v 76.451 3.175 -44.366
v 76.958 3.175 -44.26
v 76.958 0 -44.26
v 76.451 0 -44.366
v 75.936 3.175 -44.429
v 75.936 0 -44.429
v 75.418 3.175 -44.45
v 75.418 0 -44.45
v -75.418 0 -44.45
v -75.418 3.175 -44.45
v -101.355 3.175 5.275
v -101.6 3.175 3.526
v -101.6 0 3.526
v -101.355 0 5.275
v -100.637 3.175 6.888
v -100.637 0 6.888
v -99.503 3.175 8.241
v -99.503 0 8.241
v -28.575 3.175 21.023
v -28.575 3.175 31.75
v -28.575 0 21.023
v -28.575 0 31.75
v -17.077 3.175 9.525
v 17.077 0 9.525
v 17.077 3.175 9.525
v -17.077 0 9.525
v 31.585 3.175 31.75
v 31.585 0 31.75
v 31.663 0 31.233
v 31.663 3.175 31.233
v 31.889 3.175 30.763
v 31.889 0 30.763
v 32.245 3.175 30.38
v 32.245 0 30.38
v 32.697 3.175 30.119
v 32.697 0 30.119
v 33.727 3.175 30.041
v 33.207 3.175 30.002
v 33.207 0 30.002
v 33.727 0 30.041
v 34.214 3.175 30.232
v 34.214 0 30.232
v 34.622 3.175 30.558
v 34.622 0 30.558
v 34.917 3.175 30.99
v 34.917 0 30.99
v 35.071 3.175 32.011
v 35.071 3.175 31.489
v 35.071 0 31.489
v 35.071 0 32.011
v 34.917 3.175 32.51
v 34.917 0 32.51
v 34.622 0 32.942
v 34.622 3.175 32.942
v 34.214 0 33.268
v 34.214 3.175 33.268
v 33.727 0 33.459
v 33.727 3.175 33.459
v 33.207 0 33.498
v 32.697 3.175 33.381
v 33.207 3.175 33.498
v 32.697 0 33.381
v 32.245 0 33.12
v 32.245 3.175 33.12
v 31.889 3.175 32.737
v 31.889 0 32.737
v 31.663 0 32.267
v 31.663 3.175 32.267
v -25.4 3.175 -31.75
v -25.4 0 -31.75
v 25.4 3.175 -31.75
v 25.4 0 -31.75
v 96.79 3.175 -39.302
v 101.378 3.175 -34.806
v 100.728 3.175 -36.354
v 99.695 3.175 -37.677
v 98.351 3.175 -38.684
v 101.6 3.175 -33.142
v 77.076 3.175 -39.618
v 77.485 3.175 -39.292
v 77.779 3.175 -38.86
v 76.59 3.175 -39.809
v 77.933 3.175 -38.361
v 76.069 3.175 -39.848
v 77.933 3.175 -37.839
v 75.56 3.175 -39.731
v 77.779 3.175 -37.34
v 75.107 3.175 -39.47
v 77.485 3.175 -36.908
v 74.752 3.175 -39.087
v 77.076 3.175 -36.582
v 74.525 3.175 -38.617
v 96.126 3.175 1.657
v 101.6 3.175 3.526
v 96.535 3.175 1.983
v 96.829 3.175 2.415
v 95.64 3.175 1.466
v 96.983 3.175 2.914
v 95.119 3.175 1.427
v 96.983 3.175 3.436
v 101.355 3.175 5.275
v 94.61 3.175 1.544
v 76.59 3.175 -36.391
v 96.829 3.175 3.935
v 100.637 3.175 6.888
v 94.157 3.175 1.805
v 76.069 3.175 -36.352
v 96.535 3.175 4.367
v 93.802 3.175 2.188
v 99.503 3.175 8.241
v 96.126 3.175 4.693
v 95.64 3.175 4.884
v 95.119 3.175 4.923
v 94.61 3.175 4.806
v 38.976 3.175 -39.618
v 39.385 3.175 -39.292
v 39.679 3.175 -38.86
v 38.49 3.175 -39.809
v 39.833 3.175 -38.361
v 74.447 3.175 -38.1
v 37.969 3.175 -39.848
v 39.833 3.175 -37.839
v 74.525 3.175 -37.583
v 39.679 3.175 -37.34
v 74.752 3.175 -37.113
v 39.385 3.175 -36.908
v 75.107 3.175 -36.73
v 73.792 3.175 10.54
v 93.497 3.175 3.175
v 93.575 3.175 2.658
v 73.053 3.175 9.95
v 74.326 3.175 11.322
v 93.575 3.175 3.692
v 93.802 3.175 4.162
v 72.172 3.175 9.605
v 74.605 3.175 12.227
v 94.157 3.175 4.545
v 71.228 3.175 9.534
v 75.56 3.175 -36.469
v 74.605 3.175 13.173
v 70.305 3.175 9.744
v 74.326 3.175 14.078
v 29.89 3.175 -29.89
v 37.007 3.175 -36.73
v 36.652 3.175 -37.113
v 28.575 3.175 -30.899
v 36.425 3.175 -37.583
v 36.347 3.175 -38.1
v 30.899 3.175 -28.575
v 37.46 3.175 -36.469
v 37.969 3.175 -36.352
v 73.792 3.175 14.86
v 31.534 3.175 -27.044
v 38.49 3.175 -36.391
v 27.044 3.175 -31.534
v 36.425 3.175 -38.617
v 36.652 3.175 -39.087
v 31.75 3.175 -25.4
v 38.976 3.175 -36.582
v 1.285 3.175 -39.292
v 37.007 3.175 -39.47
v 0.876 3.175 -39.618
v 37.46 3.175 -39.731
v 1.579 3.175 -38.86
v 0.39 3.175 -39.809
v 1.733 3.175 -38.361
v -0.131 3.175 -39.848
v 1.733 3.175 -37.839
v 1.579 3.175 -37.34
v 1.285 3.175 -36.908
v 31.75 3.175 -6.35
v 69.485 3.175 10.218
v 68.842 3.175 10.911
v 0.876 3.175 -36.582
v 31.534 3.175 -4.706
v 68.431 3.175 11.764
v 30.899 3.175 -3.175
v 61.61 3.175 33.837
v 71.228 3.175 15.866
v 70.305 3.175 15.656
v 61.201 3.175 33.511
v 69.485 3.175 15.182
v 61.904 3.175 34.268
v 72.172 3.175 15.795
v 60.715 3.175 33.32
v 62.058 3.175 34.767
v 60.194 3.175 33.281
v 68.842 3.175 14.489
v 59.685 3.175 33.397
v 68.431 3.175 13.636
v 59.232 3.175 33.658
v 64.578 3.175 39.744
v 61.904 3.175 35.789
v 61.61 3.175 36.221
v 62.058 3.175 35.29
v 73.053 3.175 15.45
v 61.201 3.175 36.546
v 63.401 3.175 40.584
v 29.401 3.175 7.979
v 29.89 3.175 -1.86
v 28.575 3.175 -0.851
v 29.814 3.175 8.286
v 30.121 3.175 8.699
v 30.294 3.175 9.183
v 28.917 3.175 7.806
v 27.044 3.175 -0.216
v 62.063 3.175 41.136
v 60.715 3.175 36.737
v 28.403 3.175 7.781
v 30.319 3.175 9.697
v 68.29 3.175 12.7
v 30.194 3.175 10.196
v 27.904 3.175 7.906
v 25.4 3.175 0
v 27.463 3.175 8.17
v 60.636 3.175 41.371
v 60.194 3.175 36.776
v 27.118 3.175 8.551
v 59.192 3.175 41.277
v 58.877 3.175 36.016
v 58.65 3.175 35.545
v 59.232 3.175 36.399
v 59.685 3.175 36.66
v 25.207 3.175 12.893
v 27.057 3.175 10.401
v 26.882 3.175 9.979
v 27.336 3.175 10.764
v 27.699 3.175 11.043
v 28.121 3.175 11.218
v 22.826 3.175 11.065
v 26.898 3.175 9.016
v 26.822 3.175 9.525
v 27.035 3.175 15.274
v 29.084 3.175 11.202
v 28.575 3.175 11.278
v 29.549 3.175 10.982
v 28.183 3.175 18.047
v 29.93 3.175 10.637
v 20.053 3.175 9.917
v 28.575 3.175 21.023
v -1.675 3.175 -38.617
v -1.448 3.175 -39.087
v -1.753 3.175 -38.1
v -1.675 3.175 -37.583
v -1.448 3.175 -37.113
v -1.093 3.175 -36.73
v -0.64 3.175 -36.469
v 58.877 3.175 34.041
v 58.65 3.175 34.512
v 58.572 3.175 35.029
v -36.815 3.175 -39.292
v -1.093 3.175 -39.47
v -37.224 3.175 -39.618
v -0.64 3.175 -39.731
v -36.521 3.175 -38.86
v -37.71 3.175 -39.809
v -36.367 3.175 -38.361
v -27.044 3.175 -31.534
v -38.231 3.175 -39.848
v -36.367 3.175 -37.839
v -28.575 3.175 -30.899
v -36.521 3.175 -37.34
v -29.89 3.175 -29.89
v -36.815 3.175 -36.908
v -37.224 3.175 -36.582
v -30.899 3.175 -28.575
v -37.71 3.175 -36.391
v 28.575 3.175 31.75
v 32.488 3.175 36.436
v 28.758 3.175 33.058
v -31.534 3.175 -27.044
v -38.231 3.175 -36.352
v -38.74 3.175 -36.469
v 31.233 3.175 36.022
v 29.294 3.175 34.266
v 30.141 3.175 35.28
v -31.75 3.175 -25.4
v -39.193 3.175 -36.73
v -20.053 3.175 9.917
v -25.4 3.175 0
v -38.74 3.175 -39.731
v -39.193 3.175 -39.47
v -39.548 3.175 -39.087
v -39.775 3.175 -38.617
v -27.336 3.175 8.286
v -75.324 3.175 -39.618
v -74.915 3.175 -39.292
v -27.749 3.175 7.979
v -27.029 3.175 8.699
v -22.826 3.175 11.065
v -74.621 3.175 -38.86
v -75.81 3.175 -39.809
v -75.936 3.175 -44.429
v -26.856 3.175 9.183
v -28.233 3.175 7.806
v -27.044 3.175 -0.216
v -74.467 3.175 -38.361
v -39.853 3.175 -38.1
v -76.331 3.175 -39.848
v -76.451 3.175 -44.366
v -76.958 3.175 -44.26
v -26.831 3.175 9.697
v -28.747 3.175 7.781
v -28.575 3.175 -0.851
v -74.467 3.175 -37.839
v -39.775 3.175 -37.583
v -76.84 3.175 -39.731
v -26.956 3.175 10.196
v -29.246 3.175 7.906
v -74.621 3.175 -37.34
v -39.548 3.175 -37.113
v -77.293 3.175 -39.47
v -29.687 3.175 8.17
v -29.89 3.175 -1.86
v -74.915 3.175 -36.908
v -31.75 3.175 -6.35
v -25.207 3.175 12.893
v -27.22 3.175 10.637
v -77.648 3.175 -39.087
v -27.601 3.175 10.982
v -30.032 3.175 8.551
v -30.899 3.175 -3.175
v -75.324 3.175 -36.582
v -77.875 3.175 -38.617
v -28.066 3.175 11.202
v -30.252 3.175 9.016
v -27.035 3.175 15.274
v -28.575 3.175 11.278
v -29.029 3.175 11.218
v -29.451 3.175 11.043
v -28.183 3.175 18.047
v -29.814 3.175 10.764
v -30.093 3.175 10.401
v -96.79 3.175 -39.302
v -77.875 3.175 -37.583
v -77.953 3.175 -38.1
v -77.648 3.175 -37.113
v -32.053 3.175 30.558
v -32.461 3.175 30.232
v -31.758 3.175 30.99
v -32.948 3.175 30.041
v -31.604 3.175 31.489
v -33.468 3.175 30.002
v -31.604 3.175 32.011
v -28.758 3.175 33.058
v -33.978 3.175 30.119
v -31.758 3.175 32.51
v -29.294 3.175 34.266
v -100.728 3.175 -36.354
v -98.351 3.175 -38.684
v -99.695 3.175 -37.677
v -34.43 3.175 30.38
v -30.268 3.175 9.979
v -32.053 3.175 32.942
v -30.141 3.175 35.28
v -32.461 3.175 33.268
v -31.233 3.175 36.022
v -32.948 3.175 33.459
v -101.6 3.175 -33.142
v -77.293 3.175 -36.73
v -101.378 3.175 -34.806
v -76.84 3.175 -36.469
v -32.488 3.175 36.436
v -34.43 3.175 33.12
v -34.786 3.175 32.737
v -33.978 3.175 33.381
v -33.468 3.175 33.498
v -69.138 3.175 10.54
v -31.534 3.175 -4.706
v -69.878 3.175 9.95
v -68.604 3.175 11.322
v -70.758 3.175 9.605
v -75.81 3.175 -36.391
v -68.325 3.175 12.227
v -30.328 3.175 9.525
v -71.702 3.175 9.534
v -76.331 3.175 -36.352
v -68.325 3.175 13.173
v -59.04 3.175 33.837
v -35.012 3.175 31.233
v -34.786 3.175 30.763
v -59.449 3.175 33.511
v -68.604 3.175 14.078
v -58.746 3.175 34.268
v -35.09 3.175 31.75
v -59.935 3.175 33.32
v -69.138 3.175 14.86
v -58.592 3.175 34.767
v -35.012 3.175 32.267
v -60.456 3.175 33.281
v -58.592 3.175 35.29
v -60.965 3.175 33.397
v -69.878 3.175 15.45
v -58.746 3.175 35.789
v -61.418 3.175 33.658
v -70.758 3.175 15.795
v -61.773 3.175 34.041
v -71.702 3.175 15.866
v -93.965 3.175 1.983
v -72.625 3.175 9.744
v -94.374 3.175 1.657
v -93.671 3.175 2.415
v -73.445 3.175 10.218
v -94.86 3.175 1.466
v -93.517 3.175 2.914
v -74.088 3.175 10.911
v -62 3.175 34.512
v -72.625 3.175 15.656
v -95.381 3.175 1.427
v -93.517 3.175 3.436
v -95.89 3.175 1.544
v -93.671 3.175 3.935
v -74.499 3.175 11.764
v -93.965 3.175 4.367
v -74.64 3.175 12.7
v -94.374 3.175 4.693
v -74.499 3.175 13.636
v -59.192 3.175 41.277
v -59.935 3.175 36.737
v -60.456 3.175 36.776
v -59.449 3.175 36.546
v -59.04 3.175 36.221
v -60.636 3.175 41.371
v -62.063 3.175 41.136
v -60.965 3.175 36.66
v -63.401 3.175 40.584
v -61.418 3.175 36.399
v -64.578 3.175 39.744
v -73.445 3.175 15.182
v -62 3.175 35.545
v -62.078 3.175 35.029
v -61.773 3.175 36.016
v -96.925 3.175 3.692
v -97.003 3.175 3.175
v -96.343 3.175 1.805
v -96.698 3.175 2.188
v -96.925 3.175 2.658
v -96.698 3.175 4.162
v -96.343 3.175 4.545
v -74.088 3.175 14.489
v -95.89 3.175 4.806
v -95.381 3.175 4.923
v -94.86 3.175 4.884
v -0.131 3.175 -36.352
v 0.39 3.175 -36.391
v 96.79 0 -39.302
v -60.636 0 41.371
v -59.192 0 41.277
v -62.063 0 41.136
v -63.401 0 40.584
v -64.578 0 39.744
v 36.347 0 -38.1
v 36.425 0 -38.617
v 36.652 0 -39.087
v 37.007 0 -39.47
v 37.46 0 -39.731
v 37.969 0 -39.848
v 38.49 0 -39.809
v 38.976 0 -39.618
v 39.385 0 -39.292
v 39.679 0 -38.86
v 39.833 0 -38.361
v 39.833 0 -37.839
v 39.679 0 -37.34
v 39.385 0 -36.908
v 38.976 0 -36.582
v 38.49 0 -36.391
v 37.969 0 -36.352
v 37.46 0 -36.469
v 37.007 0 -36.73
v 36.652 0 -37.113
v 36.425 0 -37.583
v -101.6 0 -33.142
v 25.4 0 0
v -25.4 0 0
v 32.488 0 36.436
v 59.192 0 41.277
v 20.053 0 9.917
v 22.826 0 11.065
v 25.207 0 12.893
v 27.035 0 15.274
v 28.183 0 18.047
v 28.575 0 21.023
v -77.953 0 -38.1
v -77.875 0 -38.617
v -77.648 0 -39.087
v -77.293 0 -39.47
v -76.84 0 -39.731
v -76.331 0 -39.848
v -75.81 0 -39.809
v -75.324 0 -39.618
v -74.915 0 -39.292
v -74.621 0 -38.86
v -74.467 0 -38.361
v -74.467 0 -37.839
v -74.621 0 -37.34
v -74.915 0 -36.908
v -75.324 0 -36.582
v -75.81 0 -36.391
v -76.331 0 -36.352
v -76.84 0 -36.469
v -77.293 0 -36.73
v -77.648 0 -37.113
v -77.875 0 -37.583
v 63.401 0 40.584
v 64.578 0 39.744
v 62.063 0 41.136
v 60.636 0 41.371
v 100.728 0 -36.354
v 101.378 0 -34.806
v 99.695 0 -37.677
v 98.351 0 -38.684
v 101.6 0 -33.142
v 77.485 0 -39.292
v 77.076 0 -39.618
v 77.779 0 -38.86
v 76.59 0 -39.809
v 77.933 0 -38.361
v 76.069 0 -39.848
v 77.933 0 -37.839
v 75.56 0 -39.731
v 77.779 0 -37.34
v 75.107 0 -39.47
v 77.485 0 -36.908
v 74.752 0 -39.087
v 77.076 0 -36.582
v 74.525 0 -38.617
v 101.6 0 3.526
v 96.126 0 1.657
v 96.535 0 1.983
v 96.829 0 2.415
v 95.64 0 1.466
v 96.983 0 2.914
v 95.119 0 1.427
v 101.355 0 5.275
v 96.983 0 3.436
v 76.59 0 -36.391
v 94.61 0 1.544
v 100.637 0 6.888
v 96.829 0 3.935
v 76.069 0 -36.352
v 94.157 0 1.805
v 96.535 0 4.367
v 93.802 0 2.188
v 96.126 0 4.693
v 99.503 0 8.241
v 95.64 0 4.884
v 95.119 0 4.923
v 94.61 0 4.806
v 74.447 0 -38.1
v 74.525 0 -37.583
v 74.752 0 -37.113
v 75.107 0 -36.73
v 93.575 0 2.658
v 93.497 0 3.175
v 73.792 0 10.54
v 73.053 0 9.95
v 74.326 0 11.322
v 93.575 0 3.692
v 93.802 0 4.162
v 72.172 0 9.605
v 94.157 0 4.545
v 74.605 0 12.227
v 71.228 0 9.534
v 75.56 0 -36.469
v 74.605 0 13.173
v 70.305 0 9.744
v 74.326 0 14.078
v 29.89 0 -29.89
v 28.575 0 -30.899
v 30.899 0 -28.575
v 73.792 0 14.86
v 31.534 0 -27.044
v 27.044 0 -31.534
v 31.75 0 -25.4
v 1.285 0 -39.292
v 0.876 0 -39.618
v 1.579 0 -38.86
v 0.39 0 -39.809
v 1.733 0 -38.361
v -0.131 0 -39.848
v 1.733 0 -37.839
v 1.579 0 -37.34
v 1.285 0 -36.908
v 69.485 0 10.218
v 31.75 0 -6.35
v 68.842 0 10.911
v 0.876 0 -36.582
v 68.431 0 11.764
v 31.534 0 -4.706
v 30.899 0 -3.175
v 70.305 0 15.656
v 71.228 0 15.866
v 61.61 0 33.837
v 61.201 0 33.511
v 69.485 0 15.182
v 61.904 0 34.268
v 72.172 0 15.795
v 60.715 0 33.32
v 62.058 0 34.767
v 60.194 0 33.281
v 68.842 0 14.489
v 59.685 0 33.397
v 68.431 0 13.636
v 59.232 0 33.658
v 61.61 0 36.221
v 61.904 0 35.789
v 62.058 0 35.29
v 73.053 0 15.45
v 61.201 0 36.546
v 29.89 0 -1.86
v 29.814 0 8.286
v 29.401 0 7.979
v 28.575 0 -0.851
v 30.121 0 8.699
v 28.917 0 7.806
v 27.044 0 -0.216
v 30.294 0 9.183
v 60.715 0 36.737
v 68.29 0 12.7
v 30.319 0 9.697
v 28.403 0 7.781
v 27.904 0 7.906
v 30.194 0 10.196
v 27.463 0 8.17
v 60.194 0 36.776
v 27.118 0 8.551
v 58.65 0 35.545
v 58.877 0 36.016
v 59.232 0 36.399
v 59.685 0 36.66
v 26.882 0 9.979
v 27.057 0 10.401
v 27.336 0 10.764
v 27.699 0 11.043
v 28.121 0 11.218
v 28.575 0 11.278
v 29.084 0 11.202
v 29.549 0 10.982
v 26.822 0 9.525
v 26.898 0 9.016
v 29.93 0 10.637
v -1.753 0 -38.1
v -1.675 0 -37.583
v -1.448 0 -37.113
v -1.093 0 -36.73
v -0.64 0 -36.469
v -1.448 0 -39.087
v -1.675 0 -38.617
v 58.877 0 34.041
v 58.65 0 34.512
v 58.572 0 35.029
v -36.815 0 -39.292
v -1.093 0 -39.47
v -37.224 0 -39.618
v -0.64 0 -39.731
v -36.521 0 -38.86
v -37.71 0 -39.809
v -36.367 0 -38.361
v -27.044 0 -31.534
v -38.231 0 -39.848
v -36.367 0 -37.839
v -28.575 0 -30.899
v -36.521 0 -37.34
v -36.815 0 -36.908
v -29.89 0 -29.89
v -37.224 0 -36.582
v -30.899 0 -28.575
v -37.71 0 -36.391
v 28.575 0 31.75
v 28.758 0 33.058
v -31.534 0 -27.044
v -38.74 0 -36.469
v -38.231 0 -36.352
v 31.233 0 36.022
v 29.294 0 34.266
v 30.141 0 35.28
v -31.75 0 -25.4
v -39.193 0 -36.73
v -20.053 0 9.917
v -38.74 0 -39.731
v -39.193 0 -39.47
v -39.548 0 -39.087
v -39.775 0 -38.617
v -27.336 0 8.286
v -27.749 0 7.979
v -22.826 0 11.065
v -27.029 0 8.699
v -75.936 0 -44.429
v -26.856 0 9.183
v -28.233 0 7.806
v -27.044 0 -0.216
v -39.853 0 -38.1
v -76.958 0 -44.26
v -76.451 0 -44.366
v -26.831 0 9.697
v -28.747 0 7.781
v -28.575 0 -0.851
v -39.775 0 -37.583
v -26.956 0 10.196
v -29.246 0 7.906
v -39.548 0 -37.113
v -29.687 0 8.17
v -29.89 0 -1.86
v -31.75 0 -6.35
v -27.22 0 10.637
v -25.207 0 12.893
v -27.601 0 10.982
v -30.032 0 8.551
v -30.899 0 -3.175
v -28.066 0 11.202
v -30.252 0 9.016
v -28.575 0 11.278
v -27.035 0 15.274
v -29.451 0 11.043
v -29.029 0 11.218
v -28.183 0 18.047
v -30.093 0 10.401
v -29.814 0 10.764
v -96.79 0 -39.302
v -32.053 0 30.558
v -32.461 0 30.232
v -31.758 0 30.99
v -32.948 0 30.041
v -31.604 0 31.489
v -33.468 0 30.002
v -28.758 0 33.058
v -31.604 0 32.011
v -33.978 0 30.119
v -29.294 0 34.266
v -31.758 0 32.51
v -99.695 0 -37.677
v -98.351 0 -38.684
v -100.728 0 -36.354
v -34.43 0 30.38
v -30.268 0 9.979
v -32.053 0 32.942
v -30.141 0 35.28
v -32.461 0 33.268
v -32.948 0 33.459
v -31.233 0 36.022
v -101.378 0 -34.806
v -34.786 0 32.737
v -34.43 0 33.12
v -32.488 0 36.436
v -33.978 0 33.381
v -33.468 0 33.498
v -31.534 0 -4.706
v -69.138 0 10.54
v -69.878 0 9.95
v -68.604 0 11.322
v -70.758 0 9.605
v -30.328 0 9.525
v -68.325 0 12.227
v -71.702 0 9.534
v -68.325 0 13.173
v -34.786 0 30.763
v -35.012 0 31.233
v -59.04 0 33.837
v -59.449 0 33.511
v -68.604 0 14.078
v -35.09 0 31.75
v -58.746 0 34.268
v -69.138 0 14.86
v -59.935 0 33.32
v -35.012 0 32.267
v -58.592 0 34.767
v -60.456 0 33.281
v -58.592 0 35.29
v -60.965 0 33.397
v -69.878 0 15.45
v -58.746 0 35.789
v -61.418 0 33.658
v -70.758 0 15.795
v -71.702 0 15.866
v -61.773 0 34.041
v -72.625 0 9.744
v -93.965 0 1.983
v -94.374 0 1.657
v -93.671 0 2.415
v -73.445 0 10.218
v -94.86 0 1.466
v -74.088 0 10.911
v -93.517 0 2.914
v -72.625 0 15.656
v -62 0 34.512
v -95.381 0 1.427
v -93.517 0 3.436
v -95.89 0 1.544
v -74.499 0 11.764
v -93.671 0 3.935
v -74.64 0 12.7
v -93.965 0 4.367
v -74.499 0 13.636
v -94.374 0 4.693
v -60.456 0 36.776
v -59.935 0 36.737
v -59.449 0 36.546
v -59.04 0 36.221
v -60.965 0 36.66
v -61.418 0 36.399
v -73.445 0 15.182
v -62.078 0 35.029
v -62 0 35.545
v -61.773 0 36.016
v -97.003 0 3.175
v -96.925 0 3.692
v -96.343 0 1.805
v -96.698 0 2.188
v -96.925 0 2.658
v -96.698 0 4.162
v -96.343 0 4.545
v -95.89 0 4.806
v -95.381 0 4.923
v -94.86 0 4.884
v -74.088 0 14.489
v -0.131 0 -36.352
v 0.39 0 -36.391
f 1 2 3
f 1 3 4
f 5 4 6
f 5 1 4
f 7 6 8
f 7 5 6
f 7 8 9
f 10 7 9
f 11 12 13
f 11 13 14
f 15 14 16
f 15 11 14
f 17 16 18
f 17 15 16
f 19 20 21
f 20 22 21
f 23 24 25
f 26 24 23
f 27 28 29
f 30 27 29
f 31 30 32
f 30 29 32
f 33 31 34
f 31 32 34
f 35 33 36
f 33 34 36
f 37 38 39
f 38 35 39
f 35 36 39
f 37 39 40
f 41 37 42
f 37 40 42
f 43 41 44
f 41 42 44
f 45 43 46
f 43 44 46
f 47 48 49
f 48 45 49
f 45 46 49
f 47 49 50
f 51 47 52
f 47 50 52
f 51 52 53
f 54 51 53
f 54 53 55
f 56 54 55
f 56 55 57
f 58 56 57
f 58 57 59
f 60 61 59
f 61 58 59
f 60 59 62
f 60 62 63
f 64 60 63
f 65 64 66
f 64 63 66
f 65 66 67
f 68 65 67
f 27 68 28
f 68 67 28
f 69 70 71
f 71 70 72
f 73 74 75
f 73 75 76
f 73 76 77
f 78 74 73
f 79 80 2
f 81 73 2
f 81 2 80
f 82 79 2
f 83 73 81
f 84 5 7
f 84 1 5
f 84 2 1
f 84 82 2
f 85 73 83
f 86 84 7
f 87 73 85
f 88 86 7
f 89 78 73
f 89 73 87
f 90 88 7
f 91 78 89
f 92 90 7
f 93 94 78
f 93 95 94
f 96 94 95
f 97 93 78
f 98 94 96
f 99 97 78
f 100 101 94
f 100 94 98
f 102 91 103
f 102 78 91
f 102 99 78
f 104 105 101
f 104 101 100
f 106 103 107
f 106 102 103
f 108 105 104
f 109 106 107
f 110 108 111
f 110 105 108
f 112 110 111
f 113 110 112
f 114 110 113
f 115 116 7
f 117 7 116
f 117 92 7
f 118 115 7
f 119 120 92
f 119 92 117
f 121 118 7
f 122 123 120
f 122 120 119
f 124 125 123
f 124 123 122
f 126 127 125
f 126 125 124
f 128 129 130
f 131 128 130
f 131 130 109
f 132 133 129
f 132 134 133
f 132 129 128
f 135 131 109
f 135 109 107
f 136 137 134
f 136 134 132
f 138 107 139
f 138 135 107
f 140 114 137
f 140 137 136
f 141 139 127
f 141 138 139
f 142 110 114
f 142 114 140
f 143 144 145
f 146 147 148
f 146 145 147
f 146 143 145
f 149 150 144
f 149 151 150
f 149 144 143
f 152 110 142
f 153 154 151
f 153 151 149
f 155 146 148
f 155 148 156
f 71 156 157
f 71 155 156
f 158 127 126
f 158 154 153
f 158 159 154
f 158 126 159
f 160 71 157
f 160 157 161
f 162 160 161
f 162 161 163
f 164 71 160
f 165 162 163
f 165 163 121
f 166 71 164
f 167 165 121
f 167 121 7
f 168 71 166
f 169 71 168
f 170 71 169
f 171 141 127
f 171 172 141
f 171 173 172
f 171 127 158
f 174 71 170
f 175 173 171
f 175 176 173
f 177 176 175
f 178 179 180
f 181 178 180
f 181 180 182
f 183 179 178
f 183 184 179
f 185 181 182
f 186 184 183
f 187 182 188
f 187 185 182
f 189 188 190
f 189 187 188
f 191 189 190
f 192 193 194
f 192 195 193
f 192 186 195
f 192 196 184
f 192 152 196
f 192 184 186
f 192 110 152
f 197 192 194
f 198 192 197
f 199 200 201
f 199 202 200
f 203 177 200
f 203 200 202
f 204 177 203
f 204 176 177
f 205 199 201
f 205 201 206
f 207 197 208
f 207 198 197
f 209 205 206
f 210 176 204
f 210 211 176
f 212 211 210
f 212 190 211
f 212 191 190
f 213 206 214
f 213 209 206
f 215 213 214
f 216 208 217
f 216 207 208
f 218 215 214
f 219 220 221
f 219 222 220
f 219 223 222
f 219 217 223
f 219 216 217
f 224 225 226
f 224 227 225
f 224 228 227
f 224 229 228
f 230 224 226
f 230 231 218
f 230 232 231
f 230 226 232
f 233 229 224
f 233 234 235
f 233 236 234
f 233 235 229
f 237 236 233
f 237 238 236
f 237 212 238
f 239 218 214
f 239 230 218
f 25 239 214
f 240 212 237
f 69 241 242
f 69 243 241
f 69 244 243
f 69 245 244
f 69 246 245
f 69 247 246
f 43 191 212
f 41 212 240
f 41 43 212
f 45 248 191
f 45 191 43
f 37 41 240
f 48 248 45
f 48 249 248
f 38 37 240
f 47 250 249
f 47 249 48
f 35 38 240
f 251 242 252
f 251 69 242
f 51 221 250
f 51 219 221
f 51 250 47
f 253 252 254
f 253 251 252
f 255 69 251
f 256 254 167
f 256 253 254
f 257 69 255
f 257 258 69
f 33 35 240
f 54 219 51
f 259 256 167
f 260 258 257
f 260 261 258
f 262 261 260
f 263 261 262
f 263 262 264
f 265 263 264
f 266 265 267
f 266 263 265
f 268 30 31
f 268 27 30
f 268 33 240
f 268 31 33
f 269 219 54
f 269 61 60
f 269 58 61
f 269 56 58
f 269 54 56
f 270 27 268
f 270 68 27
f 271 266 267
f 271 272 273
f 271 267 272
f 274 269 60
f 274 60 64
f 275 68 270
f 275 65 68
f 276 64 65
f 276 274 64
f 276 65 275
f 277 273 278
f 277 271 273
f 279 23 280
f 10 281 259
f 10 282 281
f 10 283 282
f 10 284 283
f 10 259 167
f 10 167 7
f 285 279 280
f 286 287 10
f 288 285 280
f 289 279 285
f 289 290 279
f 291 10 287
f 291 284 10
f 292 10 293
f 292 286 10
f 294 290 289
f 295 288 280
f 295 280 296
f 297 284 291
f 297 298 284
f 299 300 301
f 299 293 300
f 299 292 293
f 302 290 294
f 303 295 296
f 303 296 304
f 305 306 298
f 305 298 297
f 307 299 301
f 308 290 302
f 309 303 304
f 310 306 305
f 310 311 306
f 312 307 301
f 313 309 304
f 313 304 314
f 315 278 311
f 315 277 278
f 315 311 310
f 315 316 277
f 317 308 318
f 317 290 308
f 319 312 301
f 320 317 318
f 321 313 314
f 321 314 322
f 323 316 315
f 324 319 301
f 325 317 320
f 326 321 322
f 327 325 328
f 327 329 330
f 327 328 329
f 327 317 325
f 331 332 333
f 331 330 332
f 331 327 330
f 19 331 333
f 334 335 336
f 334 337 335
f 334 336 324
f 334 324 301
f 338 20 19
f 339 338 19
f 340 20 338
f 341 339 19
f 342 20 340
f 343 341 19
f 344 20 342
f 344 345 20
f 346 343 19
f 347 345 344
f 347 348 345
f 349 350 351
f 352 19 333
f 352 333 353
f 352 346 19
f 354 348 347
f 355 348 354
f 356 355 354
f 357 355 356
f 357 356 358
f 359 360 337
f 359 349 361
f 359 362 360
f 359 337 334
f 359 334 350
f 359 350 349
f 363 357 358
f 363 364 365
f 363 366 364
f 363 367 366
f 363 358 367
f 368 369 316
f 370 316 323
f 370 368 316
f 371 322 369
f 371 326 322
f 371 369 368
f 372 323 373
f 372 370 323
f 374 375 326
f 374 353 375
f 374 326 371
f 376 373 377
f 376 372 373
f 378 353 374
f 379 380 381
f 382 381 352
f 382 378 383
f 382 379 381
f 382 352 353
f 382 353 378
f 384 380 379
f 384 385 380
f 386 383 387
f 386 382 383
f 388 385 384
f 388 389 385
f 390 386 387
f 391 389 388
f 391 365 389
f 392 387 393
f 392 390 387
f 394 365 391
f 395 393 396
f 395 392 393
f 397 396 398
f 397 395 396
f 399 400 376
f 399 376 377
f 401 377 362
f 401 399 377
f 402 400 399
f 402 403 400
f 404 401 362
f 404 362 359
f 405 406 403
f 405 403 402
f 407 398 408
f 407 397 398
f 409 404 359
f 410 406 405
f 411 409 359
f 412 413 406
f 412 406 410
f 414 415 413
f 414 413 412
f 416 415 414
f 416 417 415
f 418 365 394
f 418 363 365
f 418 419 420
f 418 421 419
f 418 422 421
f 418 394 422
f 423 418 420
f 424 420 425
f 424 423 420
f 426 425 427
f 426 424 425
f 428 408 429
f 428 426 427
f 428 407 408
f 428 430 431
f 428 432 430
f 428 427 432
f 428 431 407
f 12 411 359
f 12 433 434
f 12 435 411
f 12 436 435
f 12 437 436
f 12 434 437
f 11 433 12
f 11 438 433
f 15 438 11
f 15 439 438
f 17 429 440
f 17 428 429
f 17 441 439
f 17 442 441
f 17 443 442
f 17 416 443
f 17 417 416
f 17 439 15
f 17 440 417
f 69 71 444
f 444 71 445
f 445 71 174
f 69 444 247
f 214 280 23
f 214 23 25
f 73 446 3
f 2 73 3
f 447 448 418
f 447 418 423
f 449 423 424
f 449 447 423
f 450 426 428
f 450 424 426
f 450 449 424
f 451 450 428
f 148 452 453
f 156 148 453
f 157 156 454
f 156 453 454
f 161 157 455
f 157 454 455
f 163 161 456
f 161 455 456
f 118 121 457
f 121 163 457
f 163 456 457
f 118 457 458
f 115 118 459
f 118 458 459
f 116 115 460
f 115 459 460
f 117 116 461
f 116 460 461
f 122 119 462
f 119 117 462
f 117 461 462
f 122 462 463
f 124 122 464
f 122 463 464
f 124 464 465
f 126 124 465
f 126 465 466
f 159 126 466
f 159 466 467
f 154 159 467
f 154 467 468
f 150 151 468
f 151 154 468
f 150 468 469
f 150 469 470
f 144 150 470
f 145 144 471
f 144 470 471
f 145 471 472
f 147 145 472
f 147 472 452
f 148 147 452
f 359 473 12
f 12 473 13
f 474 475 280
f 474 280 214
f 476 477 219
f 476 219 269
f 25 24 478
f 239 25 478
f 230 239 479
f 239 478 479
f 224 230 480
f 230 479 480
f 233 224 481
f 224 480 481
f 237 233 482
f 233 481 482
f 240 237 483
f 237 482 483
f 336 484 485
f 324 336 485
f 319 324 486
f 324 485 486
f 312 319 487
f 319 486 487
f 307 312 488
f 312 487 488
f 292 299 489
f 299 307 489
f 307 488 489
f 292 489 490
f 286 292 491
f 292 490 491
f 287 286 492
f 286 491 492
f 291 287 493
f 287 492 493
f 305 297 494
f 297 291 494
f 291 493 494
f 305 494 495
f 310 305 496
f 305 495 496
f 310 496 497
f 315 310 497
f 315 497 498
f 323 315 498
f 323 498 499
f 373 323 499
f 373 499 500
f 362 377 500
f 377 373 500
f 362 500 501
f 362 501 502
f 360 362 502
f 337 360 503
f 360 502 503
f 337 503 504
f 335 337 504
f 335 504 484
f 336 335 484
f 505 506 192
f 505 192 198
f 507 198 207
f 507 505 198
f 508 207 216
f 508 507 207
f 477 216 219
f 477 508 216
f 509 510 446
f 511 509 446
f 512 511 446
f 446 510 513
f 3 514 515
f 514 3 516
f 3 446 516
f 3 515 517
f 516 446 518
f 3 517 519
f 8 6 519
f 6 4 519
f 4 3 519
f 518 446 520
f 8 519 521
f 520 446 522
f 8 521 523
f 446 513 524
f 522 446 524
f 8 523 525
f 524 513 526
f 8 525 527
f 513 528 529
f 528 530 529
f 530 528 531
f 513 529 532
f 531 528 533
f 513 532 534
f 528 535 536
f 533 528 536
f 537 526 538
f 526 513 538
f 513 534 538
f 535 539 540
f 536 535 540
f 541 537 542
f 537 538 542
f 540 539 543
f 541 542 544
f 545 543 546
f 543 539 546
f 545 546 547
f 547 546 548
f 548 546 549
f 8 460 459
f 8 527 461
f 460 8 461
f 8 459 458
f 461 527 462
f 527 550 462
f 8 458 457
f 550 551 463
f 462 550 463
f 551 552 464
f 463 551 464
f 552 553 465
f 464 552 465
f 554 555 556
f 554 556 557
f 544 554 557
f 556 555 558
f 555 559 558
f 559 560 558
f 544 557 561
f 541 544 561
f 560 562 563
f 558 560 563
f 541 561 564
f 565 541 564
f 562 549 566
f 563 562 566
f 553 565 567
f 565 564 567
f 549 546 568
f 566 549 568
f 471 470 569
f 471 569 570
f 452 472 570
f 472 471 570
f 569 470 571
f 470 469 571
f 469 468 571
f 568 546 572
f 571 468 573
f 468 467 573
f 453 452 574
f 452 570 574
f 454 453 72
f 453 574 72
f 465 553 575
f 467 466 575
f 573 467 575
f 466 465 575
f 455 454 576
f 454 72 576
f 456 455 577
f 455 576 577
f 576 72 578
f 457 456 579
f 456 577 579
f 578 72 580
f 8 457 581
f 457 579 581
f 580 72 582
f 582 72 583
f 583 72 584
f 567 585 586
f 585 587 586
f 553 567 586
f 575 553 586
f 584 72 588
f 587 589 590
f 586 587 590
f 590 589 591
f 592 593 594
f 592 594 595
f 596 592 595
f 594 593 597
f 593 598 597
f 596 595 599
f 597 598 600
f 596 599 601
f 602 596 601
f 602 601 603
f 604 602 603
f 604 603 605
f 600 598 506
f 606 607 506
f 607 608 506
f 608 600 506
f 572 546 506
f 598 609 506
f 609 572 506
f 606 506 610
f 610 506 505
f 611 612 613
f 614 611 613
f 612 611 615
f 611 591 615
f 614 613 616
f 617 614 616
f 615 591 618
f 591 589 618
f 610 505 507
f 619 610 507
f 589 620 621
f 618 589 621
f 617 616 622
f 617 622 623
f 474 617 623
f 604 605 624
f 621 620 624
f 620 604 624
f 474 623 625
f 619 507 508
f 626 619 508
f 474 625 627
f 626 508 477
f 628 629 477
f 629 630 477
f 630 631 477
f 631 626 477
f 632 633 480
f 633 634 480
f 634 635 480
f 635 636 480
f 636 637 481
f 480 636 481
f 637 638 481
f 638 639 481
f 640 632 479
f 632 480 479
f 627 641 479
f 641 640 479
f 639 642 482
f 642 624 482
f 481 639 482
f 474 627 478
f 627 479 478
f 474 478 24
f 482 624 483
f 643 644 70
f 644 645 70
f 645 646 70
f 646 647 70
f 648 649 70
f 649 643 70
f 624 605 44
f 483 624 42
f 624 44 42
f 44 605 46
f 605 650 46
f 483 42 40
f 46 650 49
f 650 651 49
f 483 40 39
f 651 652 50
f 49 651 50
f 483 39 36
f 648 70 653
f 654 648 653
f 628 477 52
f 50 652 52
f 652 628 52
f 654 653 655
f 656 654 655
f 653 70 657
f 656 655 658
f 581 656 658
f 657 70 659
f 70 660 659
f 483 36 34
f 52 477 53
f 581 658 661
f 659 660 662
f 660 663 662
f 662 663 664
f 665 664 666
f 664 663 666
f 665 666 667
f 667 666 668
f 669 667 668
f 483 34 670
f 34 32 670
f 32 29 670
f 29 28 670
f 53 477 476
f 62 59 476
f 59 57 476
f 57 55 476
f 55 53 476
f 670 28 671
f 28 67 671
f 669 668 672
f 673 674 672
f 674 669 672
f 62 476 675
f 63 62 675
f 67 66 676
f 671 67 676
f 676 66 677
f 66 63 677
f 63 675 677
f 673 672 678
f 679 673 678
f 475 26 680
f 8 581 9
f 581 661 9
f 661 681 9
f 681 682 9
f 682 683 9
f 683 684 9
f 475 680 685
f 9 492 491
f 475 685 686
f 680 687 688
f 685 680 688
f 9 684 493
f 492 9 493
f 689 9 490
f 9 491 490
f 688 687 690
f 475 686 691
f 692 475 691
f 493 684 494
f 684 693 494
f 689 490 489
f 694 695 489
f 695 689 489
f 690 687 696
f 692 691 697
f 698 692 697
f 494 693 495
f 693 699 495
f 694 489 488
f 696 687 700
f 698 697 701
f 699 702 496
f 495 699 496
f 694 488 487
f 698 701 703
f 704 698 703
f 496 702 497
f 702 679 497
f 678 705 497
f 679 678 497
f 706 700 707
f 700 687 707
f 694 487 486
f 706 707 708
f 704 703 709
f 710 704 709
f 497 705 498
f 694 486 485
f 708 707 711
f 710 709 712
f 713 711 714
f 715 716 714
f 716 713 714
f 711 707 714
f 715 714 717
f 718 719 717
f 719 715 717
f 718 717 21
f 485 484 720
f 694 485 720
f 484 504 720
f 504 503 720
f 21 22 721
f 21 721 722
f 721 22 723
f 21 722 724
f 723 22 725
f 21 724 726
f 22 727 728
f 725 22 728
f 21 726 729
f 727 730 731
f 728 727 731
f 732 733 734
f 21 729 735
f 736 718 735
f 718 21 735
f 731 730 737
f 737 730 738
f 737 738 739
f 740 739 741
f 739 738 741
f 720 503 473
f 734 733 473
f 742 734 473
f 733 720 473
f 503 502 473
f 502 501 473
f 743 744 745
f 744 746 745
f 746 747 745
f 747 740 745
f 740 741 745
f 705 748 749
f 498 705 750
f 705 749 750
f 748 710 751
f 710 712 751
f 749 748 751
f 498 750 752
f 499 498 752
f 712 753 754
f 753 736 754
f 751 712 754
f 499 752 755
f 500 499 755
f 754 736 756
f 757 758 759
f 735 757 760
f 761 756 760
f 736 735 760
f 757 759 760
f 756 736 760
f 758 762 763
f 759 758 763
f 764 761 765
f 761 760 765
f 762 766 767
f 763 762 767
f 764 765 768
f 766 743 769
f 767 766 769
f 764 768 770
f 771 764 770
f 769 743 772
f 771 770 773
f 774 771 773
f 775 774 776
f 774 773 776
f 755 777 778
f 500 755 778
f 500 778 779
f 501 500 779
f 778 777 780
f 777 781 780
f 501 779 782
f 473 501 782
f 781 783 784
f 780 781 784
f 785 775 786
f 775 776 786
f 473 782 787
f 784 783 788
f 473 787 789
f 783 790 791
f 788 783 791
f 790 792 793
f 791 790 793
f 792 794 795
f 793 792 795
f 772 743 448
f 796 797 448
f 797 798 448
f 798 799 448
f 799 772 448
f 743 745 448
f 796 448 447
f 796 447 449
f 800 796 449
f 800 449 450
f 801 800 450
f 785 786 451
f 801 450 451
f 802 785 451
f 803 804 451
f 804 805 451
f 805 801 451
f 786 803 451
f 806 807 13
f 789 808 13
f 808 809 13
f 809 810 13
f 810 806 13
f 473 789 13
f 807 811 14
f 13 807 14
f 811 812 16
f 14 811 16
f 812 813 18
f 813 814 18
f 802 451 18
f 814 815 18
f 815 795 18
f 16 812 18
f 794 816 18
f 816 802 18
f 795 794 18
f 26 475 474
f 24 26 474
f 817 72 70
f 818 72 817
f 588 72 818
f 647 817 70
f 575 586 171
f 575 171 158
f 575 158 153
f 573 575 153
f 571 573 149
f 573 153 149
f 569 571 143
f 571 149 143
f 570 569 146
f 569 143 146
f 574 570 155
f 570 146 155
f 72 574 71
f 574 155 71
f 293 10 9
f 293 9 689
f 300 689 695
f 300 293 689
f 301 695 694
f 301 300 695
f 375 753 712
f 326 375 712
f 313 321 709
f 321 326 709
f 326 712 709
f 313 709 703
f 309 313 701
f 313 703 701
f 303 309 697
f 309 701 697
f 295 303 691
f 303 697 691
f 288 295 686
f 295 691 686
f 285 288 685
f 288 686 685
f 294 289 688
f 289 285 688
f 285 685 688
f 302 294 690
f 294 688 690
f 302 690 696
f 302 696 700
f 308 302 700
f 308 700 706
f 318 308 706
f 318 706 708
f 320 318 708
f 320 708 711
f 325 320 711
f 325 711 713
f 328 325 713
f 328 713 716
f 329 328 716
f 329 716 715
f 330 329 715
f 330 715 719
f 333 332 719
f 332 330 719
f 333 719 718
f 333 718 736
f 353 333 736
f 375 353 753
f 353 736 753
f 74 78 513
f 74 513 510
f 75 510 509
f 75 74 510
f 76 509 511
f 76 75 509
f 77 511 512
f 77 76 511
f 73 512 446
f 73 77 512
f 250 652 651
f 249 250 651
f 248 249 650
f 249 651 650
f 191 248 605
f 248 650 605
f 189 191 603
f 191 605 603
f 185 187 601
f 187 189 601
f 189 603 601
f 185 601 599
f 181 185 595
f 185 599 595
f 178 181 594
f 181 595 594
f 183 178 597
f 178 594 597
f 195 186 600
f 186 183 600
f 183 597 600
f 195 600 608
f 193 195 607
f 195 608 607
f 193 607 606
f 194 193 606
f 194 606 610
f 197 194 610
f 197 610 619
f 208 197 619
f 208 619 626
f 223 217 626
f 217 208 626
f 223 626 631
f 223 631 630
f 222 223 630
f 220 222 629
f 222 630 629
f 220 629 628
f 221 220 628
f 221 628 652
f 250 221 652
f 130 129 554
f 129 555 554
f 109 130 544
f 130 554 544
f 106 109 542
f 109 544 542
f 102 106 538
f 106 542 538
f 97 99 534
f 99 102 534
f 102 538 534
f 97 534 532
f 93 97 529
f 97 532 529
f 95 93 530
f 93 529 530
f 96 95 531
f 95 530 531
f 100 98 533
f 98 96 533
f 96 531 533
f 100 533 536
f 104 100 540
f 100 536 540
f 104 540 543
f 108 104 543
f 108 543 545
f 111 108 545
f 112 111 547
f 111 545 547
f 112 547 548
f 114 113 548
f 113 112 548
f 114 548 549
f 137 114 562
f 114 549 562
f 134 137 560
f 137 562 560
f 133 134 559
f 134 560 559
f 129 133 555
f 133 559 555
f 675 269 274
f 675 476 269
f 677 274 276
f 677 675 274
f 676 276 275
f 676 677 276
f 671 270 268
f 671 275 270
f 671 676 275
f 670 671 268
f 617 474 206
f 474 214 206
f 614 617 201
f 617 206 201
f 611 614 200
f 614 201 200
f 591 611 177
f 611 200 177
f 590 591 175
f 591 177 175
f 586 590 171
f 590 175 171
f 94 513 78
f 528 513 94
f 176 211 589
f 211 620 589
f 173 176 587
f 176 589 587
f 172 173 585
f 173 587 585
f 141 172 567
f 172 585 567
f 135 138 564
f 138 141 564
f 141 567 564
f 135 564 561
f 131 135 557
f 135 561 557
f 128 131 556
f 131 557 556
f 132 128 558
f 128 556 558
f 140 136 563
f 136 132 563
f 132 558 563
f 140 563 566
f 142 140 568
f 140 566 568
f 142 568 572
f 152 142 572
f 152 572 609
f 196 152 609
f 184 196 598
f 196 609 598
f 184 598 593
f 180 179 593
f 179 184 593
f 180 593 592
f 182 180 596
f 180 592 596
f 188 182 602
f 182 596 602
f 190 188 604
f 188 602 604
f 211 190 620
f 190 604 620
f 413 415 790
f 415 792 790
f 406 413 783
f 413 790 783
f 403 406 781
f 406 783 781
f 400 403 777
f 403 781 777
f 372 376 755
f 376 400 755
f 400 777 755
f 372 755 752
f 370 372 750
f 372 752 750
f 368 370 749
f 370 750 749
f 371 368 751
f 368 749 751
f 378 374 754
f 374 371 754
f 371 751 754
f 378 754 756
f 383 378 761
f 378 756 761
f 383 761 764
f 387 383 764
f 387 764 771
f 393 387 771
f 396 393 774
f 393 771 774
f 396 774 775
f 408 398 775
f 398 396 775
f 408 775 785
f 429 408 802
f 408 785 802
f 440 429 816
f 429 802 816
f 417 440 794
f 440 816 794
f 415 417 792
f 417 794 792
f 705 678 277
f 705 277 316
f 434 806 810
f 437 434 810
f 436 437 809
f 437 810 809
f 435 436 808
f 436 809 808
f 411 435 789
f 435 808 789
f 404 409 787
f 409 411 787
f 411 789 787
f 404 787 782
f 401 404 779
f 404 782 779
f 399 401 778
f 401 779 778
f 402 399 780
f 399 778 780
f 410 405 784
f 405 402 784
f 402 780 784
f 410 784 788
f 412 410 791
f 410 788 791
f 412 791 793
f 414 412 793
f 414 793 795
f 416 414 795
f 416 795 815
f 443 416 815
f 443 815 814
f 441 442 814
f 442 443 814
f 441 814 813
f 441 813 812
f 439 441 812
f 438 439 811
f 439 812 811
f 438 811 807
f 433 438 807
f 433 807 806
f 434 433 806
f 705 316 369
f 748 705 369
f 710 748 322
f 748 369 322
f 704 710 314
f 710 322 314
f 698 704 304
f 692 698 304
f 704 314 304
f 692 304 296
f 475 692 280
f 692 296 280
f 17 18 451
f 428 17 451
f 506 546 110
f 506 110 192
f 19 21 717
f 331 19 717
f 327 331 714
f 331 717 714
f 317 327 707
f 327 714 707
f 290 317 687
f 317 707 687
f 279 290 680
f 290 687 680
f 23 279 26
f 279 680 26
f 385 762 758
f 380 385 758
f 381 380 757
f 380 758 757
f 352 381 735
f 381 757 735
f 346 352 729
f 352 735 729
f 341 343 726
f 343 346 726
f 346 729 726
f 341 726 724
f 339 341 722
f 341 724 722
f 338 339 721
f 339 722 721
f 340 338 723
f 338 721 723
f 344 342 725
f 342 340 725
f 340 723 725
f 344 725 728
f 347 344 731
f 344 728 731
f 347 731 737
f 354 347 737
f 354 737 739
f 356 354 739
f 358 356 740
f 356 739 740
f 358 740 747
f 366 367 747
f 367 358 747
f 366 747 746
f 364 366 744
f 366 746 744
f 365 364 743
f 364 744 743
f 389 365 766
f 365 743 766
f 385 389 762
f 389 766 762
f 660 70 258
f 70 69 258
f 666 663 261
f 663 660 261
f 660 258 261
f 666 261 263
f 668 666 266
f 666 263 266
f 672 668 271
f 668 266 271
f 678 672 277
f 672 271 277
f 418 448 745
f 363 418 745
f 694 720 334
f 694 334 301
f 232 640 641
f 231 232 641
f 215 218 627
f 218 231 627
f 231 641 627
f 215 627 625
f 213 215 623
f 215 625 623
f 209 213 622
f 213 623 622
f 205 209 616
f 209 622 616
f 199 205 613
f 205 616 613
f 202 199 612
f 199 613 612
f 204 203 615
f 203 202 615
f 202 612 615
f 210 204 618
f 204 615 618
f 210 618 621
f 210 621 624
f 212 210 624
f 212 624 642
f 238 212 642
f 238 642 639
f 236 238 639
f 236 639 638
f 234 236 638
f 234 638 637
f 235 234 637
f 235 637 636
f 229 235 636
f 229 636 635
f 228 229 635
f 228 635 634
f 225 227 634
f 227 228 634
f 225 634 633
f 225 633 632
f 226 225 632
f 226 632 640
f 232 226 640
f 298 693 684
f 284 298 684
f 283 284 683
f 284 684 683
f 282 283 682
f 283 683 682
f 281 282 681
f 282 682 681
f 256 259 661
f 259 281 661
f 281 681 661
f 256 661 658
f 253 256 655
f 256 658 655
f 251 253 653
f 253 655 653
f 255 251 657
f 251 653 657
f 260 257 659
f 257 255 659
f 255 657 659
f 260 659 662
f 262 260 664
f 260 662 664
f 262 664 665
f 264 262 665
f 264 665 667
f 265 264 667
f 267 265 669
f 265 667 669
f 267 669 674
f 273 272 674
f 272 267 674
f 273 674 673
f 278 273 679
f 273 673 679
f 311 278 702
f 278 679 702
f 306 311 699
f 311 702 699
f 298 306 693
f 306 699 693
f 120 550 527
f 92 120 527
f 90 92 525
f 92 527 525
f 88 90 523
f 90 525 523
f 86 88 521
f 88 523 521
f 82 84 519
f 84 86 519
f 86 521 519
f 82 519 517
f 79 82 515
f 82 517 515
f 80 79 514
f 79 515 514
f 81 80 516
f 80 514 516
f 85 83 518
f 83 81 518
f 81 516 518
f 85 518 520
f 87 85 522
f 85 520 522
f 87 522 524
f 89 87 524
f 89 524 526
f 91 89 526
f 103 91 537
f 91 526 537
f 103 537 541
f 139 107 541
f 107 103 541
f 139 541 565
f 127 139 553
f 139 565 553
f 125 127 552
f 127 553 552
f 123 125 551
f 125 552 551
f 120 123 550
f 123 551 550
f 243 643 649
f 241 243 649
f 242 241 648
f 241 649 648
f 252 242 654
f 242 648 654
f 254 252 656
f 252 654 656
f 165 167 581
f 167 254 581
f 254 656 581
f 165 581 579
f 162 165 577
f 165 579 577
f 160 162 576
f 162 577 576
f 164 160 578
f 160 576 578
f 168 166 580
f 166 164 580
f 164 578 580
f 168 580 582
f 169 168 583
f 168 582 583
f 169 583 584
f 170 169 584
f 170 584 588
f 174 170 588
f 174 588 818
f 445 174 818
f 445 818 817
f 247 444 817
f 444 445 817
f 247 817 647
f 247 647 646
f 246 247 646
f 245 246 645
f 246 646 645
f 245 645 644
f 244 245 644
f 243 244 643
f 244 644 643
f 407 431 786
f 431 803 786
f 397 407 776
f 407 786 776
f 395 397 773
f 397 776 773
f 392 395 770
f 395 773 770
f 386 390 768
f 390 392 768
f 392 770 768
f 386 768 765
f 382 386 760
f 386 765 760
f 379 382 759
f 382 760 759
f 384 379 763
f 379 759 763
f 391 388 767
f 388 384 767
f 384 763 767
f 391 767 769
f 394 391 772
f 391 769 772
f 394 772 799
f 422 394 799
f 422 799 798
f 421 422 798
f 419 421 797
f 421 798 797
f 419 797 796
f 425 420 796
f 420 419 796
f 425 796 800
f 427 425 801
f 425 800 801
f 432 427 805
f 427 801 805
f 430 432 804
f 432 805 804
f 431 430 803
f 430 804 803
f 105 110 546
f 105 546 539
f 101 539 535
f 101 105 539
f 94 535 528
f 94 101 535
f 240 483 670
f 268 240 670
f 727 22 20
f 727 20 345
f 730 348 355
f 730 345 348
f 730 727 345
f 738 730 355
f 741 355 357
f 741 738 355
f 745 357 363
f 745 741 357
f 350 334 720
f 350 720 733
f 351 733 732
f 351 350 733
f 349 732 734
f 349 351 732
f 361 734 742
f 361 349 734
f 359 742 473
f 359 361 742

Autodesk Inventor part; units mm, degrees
ref_plane "YZ Plane" through (0, 0, 0) normal (1, 0, 0) x (0, 1, 0)
ref_plane "XZ Plane" through (0, 0, 0) normal (0, 1, 0) x (-1, 0, 0)
ref_plane "XY Plane" through (0, 0, 0) normal (0, 0, 1) x (1, 0, 0)
sketch "Sketch1" plane through (0, 0, 0) normal (0, 1, 0) x (-1, 0, 0)
  line L0 (101.6, 38.1) -> (-101.6, 38.1) construction
  line L1 (-101.6, 38.1) -> (-101.6, -38.1) construction
  line L2 (-101.6, -38.1) -> (101.6, -38.1) construction
  line L3 (101.6, -38.1) -> (101.6, 38.1) construction
  line L4 (101.6, 38.1) -> (-101.6, -38.1) construction
  line L5 (-101.6, 38.1) -> (101.6, -38.1) construction
  line L6 (-28.575, 66.675) -> (28.575, 66.675) construction
  line L7 (28.575, 66.675) -> (28.575, 9.525)
  line L8 (28.575, 9.525) -> (-28.575, 9.525) construction
  line L9 (-28.575, 9.525) -> (-28.575, 66.675)
  line L10 (-28.575, 66.675) -> (28.575, 9.525) construction
  line L11 (28.575, 66.675) -> (-28.575, 9.525) construction
  circle A0 centre (-38.1, 50.8) radius 3.175
  line L12 (0, 38.1) -> (0, -38.1) construction
  circle A1 centre (-38.1, 50.8) radius 9.525
  line L13 (-38.1, 60.325) -> (-28.575, 60.325)
  circle A2 centre (38.1, 50.8) radius 3.175
  circle A3 centre (38.1, 50.8) radius 9.525
  line L14 (38.1, 60.325) -> (28.575, 60.325)
  circle A4 centre (-76.2, -38.1) radius 1.7526
  circle A5 centre (-95.25, 3.175) radius 1.7526
  circle A6 centre (76.2, -38.1) radius 1.7526
  circle A7 centre (95.25, 3.175) radius 1.7526
  line L15 (-101.6, -38.1) -> (-101.6, 6.35)
  line L16 (-101.6, 6.35) -> (-44.4797, 57.8728)
  line L17 (101.6, -38.1) -> (101.6, 6.35)
  line L18 (101.6, 6.35) -> (44.4797, 57.8728)
  line L19 (-42.6417, 42.4275) -> (-87.975, 1.5367) construction
  line L20 (-87.975, 1.5367) -> (-87.975, -38.1)
  line L21 (87.975, -38.1) -> (87.975, 1.5367)
  line L22 (87.975, 1.5367) -> (42.6417, 42.4275) construction
  line L23 (0, -38.1) -> (-95.25, -38.1) construction
  line L24 (0, -38.1) -> (95.25, -38.1) construction
  circle A8 centre (-60.325, 35.0287) radius 1.7526
  circle A9 centre (-33.3375, 31.75) radius 1.7526
  line L25 (-38.1, 0) -> (-38.1, 41.275)
  line L26 (-38.1, 0) -> (0, 0) construction
  circle A10 centre (60.325, 35.0287) radius 1.7526
  circle A11 centre (33.3375, 31.75) radius 1.7526
  line L27 (38.1, 0) -> (38.1, 41.275)
  line L28 (38.1, 0) -> (0, 0) construction
  line L29 (-87.975, 0) -> (-65.115, 0)
  line L30 (-65.115, 0) -> (-65.115, -31.75)
  line L31 (-65.115, -31.75) -> (-87.975, -31.75)
  line L32 (-101.6, -38.1) -> (101.6, -38.1) construction
  line L33 (101.6, -38.1) -> (101.6, 19.05)
  line L34 (101.6, 19.05) -> (-101.6, 19.05) construction
  line L35 (-101.6, 19.05) -> (-101.6, -38.1)
  line L36 (-101.6, 19.05) -> (-87.5203, 19.05) construction
  line L37 (87.5203, 19.05) -> (101.6, 19.05) construction
  circle A12 centre (-38.1, 0) radius 3.175 construction
  circle A13 centre (-38.1, 0) radius 6.35 construction
  circle A14 centre (38.1, 0) radius 3.175 construction
  circle A15 centre (38.1, 0) radius 6.35 construction
  circle A16 centre (28.575, 9.525) radius 1.7526
  circle A17 centre (28.575, 9.525) radius 4.7625
  arc A18 (17.0773, 9.525) -> (28.575, 21.0227) centre (17.0773, 21.0227) ccw
  circle A19 centre (-28.575, 9.525) radius 1.7526
  circle A20 centre (-28.575, 9.525) radius 4.7625
  arc A21 (-28.575, 21.0227) -> (-17.0773, 9.525) centre (-17.0773, 21.0227) ccw
  arc A22 (31.4325, 5.715) -> (38.1, 19.05) centre (21.4312, 19.05) ccw
  arc A23 (-38.1, 19.05) -> (-31.4325, 5.715) centre (-21.4312, 19.05) ccw
  line L38 (-61.94, -38.1) -> (-61.94, 25.0204)
  line L39 (87.975, 0) -> (65.115, 0)
  line L40 (65.115, 0) -> (65.115, -31.75)
  line L41 (65.115, -31.75) -> (87.975, -31.75)
  line L42 (61.94, -38.1) -> (61.94, 25.0204)
  line L43 (-28.575, 4.7625) -> (28.575, 4.7625)
  line L44 (101.6, -31.75) -> (-101.6, -31.75)
  line L45 (-101.6, -31.75) -> (-101.6, -44.45) construction
  line L46 (-101.6, -44.45) -> (101.6, -44.45)
  line L47 (101.6, -44.45) -> (101.6, -31.75) construction
  circle A24 centre (0, -38.1) radius 1.7526
  circle A25 centre (38.1, -38.1) radius 1.7526
  circle A26 centre (-38.1, -38.1) radius 1.7526
  line L48 (101.6, -38.1) -> (76.2, -44.45)
  line L49 (-101.6, -38.1) -> (-76.2, -44.45)
  line L50 (76.2, -38.1) -> (76.2, -44.45) construction
  line L51 (-76.2, -38.1) -> (-76.2, -44.45) construction
  line L52 (59.1924, 41.2769) -> (32.488, 36.4361)
  circle A27 centre (60.325, 35.0287) radius 6.35
  circle A28 centre (33.3375, 31.75) radius 4.7625
  line L53 (-59.1924, 41.2769) -> (-32.488, 36.4361)
  circle A29 centre (-60.325, 35.0287) radius 6.35
  circle A30 centre (-33.3375, 31.75) radius 4.7625
  line L54 (-87.975, 0) -> (-65.115, 0)
  line L55 (-65.115, 0) -> (-65.115, -3.175)
  line L56 (-65.115, -3.175) -> (-87.975, -3.175)
  line L57 (-87.975, -3.175) -> (-87.975, 0)
  line L58 (-65.115, -15.875) -> (-87.975, -15.875) construction
  line L59 (-65.115, -28.575) -> (-87.975, -28.575)
  line L60 (-84.8, -38.1) -> (-84.8, 0.1248)
  line L61 (65.115, -3.175) -> (87.975, -3.175)
  line L62 (65.115, -15.875) -> (87.975, -15.875) construction
  line L63 (65.115, -28.575) -> (87.975, -28.575)
  line L64 (84.8, -38.1) -> (84.8, 0.1248)
  line L65 (-31.75, -31.75) -> (31.75, -31.75)
  line L66 (31.75, -31.75) -> (31.75, 0)
  line L67 (31.75, 0) -> (-31.75, 0)
  line L68 (-31.75, 0) -> (-31.75, -31.75)
  circle A31 centre (71.465, 12.7) radius 3.175
  circle A32 centre (-71.465, 12.7) radius 3.175
  line L69 (-17.0773, 9.525) -> (17.0773, 9.525)
  point P0 (28.575, 38.1)
  point P1 (-28.575, 38.1)
  point P2 (28.575, 60.325)
  point P3 (44.4797, 57.8728)
  point P4 (101.6, -15.875)
  point P5 (38.1, 41.275)
  point P6 (-87.975, -31.75)
  point P7 (-101.6, 6.35)
  point P8 (101.6, 6.35)
  point P9 (31.75, 0)
  point P10 (38.1, 6.35)
  point P11 (-38.1, 6.35)
  point P12 (-31.75, 0)
  point P13 (87.975, 0)
  point P14 (61.94, 25.0204)
  point P15 (-17.0773, 9.525)
  point P16 (-28.575, 21.0227)
  point P17 (-38.1, 19.05)
  point P18 (-31.4325, 5.715)
  point P19 (-21.8502, 0)
  point P20 (21.8502, 0)
  point P21 (-25.2074, 12.8926)
  point P22 (-28.575, 14.2875)
  point P23 (-23.8125, 9.525)
  point P24 (-28.575, 50.8)
  point P25 (25.2074, 12.8926)
  point P26 (28.575, 14.2875)
  point P27 (23.8125, 9.525)
  point P28 (28.575, 50.8)
  point P29 (26.8224, 9.525)
  point P30 (28.575, 11.2776)
  point P31 (61.94, -31.75)
  point P32 (-61.94, -31.75)
  point P33 (-28.575, 31.75)
  point P34 (-64.5781, 39.7439)
  point P35 (64.5781, 39.7439)
  point P36 (28.575, 31.75)
  point P37 (-84.8, -3.175)
  point P38 (-84.8, -28.575)
  point P39 (84.8, -3.175)
  point P40 (84.8, -28.575)
  point P41 (31.75, -31.75)
  point P42 (-101.6, -31.75)
  point P43 (31.75, -31.75)
  point P44 (-26.8224, 9.525)
  point P45 (-28.575, 11.2776)
  point P46 (-39.8526, -38.1)
  point P47 (-36.3474, -38.1)
  point P48 (-1.7526, -38.1)
  point P49 (1.7526, -38.1)
  point P50 (36.3474, -38.1)
  point P51 (39.8526, -38.1)
  dimension "d0" = 203.2
  dimension "d1" = 76.2
  dimension "d4" = 57.15
  dimension "d6" = 6.35
  dimension "d7" = 38.1
  dimension "d8" = 19.05
  dimension "d10" = 3.5052
  dimension "d11" = 3.5052
  dimension "d12" = 0
  dimension "d14" = 25.4
  dimension "d15" = 6.35
  dimension "d20" = 50.8
  dimension "d21" = 41.275
  dimension "d22" = 44.45
  dimension "d24" = 12.7
  dimension "d25" = 13.625
  dimension "d26" = 12.7
  dimension "d27" = 13.625
  dimension "d31" = 3.5052
  dimension "d32" = 3.5052
  dimension "d33" = 6.35
  dimension "d34" = 31.75
  dimension "d35" = 4.7625
  dimension "d36" = 22.225
  dimension "d37" = 9.525
  dimension "d39" = 31.75
  dimension "d40" = 6.35
  dimension "d42" = 57.15
  dimension "d43" = 6.35
  dimension "d44" = 9.525
  dimension "d45" = 9.525
  dimension "d46" = 12.7
  dimension "d104" = 3.5052
  dimension "d105" = 9.525
  dimension "d106" = 3.175
  dimension "d107" = 22.86
  dimension "d123" = 88.9
  dimension "d124" = 12.7
  dimension "d125" = 3.5052
  dimension "d126" = 3.5052
  dimension "d127" = 38.1
  dimension "d128" = 28.575
  dimension "d129" = 3.175
  dimension "d130" = 3.175
  dimension "d131" = 31.75
  dimension "d132" = 31.75
  dimension "d133" = 31.75
  dimension "d135" = 6.35
  dimension "d136" = 12.7
  dimension "d137" = 9.525
extrude "Extrusion1" add sketch "Sketch1" along normal blind 3.175 contours A28 L27 A22 A17 L7 | A28 | L7 A17 A18 | L52 L27 A28 | L27 L52 A27 L18 L17 L44 L21 L39 L40 L66 L67 L68 L30 L29 L20 L15 L16 A29 L53 L25 A23 A20 L43 A17 A22 | A27 | A17 | A17 L43 A20 A21 L69 A18 | L17 L48 L46 L49 L15 L44 L31 L41 | A20 | L41 L64 L63 L21 | A23 L25 A30 L9 A20 | A20 L9 A21 | L63 L64 L61 L21 | L41 L40 L63 L64 | L61 L64 L39 L21 | L63 L40 L61 L64 | L25 L53 A30 | A30 | L61 L40 L39 L64 | A29 | L20 L59 L60 L31 | L20 L56 L60 L59 | L60 L59 L30 L31 | L20 L29 L60 L56 | L60 L56 L30 L59 | L60 L29 L30 L56
fillet "Fillet1" radius 6.35 6 edges at (101.6, 1.5875, -38.1) (101.6, 1.5875, 6.35) (-101.6, 1.5875, 6.35) (76.2, 1.5875, -44.45) (-76.2, 1.5875, -44.45) (-101.6, 1.5875, -38.1)
fillet "Fillet5" radius 6.35 4 edges at (31.75, 1.5875, 0) (-31.75, 1.5875, 0) (-31.75, 1.5875, -31.75) (31.75, 1.5875, -31.75)
equation "\"d35\" = 0.5 * d37"
properties part number "Chassis" material "UHMW, White"
